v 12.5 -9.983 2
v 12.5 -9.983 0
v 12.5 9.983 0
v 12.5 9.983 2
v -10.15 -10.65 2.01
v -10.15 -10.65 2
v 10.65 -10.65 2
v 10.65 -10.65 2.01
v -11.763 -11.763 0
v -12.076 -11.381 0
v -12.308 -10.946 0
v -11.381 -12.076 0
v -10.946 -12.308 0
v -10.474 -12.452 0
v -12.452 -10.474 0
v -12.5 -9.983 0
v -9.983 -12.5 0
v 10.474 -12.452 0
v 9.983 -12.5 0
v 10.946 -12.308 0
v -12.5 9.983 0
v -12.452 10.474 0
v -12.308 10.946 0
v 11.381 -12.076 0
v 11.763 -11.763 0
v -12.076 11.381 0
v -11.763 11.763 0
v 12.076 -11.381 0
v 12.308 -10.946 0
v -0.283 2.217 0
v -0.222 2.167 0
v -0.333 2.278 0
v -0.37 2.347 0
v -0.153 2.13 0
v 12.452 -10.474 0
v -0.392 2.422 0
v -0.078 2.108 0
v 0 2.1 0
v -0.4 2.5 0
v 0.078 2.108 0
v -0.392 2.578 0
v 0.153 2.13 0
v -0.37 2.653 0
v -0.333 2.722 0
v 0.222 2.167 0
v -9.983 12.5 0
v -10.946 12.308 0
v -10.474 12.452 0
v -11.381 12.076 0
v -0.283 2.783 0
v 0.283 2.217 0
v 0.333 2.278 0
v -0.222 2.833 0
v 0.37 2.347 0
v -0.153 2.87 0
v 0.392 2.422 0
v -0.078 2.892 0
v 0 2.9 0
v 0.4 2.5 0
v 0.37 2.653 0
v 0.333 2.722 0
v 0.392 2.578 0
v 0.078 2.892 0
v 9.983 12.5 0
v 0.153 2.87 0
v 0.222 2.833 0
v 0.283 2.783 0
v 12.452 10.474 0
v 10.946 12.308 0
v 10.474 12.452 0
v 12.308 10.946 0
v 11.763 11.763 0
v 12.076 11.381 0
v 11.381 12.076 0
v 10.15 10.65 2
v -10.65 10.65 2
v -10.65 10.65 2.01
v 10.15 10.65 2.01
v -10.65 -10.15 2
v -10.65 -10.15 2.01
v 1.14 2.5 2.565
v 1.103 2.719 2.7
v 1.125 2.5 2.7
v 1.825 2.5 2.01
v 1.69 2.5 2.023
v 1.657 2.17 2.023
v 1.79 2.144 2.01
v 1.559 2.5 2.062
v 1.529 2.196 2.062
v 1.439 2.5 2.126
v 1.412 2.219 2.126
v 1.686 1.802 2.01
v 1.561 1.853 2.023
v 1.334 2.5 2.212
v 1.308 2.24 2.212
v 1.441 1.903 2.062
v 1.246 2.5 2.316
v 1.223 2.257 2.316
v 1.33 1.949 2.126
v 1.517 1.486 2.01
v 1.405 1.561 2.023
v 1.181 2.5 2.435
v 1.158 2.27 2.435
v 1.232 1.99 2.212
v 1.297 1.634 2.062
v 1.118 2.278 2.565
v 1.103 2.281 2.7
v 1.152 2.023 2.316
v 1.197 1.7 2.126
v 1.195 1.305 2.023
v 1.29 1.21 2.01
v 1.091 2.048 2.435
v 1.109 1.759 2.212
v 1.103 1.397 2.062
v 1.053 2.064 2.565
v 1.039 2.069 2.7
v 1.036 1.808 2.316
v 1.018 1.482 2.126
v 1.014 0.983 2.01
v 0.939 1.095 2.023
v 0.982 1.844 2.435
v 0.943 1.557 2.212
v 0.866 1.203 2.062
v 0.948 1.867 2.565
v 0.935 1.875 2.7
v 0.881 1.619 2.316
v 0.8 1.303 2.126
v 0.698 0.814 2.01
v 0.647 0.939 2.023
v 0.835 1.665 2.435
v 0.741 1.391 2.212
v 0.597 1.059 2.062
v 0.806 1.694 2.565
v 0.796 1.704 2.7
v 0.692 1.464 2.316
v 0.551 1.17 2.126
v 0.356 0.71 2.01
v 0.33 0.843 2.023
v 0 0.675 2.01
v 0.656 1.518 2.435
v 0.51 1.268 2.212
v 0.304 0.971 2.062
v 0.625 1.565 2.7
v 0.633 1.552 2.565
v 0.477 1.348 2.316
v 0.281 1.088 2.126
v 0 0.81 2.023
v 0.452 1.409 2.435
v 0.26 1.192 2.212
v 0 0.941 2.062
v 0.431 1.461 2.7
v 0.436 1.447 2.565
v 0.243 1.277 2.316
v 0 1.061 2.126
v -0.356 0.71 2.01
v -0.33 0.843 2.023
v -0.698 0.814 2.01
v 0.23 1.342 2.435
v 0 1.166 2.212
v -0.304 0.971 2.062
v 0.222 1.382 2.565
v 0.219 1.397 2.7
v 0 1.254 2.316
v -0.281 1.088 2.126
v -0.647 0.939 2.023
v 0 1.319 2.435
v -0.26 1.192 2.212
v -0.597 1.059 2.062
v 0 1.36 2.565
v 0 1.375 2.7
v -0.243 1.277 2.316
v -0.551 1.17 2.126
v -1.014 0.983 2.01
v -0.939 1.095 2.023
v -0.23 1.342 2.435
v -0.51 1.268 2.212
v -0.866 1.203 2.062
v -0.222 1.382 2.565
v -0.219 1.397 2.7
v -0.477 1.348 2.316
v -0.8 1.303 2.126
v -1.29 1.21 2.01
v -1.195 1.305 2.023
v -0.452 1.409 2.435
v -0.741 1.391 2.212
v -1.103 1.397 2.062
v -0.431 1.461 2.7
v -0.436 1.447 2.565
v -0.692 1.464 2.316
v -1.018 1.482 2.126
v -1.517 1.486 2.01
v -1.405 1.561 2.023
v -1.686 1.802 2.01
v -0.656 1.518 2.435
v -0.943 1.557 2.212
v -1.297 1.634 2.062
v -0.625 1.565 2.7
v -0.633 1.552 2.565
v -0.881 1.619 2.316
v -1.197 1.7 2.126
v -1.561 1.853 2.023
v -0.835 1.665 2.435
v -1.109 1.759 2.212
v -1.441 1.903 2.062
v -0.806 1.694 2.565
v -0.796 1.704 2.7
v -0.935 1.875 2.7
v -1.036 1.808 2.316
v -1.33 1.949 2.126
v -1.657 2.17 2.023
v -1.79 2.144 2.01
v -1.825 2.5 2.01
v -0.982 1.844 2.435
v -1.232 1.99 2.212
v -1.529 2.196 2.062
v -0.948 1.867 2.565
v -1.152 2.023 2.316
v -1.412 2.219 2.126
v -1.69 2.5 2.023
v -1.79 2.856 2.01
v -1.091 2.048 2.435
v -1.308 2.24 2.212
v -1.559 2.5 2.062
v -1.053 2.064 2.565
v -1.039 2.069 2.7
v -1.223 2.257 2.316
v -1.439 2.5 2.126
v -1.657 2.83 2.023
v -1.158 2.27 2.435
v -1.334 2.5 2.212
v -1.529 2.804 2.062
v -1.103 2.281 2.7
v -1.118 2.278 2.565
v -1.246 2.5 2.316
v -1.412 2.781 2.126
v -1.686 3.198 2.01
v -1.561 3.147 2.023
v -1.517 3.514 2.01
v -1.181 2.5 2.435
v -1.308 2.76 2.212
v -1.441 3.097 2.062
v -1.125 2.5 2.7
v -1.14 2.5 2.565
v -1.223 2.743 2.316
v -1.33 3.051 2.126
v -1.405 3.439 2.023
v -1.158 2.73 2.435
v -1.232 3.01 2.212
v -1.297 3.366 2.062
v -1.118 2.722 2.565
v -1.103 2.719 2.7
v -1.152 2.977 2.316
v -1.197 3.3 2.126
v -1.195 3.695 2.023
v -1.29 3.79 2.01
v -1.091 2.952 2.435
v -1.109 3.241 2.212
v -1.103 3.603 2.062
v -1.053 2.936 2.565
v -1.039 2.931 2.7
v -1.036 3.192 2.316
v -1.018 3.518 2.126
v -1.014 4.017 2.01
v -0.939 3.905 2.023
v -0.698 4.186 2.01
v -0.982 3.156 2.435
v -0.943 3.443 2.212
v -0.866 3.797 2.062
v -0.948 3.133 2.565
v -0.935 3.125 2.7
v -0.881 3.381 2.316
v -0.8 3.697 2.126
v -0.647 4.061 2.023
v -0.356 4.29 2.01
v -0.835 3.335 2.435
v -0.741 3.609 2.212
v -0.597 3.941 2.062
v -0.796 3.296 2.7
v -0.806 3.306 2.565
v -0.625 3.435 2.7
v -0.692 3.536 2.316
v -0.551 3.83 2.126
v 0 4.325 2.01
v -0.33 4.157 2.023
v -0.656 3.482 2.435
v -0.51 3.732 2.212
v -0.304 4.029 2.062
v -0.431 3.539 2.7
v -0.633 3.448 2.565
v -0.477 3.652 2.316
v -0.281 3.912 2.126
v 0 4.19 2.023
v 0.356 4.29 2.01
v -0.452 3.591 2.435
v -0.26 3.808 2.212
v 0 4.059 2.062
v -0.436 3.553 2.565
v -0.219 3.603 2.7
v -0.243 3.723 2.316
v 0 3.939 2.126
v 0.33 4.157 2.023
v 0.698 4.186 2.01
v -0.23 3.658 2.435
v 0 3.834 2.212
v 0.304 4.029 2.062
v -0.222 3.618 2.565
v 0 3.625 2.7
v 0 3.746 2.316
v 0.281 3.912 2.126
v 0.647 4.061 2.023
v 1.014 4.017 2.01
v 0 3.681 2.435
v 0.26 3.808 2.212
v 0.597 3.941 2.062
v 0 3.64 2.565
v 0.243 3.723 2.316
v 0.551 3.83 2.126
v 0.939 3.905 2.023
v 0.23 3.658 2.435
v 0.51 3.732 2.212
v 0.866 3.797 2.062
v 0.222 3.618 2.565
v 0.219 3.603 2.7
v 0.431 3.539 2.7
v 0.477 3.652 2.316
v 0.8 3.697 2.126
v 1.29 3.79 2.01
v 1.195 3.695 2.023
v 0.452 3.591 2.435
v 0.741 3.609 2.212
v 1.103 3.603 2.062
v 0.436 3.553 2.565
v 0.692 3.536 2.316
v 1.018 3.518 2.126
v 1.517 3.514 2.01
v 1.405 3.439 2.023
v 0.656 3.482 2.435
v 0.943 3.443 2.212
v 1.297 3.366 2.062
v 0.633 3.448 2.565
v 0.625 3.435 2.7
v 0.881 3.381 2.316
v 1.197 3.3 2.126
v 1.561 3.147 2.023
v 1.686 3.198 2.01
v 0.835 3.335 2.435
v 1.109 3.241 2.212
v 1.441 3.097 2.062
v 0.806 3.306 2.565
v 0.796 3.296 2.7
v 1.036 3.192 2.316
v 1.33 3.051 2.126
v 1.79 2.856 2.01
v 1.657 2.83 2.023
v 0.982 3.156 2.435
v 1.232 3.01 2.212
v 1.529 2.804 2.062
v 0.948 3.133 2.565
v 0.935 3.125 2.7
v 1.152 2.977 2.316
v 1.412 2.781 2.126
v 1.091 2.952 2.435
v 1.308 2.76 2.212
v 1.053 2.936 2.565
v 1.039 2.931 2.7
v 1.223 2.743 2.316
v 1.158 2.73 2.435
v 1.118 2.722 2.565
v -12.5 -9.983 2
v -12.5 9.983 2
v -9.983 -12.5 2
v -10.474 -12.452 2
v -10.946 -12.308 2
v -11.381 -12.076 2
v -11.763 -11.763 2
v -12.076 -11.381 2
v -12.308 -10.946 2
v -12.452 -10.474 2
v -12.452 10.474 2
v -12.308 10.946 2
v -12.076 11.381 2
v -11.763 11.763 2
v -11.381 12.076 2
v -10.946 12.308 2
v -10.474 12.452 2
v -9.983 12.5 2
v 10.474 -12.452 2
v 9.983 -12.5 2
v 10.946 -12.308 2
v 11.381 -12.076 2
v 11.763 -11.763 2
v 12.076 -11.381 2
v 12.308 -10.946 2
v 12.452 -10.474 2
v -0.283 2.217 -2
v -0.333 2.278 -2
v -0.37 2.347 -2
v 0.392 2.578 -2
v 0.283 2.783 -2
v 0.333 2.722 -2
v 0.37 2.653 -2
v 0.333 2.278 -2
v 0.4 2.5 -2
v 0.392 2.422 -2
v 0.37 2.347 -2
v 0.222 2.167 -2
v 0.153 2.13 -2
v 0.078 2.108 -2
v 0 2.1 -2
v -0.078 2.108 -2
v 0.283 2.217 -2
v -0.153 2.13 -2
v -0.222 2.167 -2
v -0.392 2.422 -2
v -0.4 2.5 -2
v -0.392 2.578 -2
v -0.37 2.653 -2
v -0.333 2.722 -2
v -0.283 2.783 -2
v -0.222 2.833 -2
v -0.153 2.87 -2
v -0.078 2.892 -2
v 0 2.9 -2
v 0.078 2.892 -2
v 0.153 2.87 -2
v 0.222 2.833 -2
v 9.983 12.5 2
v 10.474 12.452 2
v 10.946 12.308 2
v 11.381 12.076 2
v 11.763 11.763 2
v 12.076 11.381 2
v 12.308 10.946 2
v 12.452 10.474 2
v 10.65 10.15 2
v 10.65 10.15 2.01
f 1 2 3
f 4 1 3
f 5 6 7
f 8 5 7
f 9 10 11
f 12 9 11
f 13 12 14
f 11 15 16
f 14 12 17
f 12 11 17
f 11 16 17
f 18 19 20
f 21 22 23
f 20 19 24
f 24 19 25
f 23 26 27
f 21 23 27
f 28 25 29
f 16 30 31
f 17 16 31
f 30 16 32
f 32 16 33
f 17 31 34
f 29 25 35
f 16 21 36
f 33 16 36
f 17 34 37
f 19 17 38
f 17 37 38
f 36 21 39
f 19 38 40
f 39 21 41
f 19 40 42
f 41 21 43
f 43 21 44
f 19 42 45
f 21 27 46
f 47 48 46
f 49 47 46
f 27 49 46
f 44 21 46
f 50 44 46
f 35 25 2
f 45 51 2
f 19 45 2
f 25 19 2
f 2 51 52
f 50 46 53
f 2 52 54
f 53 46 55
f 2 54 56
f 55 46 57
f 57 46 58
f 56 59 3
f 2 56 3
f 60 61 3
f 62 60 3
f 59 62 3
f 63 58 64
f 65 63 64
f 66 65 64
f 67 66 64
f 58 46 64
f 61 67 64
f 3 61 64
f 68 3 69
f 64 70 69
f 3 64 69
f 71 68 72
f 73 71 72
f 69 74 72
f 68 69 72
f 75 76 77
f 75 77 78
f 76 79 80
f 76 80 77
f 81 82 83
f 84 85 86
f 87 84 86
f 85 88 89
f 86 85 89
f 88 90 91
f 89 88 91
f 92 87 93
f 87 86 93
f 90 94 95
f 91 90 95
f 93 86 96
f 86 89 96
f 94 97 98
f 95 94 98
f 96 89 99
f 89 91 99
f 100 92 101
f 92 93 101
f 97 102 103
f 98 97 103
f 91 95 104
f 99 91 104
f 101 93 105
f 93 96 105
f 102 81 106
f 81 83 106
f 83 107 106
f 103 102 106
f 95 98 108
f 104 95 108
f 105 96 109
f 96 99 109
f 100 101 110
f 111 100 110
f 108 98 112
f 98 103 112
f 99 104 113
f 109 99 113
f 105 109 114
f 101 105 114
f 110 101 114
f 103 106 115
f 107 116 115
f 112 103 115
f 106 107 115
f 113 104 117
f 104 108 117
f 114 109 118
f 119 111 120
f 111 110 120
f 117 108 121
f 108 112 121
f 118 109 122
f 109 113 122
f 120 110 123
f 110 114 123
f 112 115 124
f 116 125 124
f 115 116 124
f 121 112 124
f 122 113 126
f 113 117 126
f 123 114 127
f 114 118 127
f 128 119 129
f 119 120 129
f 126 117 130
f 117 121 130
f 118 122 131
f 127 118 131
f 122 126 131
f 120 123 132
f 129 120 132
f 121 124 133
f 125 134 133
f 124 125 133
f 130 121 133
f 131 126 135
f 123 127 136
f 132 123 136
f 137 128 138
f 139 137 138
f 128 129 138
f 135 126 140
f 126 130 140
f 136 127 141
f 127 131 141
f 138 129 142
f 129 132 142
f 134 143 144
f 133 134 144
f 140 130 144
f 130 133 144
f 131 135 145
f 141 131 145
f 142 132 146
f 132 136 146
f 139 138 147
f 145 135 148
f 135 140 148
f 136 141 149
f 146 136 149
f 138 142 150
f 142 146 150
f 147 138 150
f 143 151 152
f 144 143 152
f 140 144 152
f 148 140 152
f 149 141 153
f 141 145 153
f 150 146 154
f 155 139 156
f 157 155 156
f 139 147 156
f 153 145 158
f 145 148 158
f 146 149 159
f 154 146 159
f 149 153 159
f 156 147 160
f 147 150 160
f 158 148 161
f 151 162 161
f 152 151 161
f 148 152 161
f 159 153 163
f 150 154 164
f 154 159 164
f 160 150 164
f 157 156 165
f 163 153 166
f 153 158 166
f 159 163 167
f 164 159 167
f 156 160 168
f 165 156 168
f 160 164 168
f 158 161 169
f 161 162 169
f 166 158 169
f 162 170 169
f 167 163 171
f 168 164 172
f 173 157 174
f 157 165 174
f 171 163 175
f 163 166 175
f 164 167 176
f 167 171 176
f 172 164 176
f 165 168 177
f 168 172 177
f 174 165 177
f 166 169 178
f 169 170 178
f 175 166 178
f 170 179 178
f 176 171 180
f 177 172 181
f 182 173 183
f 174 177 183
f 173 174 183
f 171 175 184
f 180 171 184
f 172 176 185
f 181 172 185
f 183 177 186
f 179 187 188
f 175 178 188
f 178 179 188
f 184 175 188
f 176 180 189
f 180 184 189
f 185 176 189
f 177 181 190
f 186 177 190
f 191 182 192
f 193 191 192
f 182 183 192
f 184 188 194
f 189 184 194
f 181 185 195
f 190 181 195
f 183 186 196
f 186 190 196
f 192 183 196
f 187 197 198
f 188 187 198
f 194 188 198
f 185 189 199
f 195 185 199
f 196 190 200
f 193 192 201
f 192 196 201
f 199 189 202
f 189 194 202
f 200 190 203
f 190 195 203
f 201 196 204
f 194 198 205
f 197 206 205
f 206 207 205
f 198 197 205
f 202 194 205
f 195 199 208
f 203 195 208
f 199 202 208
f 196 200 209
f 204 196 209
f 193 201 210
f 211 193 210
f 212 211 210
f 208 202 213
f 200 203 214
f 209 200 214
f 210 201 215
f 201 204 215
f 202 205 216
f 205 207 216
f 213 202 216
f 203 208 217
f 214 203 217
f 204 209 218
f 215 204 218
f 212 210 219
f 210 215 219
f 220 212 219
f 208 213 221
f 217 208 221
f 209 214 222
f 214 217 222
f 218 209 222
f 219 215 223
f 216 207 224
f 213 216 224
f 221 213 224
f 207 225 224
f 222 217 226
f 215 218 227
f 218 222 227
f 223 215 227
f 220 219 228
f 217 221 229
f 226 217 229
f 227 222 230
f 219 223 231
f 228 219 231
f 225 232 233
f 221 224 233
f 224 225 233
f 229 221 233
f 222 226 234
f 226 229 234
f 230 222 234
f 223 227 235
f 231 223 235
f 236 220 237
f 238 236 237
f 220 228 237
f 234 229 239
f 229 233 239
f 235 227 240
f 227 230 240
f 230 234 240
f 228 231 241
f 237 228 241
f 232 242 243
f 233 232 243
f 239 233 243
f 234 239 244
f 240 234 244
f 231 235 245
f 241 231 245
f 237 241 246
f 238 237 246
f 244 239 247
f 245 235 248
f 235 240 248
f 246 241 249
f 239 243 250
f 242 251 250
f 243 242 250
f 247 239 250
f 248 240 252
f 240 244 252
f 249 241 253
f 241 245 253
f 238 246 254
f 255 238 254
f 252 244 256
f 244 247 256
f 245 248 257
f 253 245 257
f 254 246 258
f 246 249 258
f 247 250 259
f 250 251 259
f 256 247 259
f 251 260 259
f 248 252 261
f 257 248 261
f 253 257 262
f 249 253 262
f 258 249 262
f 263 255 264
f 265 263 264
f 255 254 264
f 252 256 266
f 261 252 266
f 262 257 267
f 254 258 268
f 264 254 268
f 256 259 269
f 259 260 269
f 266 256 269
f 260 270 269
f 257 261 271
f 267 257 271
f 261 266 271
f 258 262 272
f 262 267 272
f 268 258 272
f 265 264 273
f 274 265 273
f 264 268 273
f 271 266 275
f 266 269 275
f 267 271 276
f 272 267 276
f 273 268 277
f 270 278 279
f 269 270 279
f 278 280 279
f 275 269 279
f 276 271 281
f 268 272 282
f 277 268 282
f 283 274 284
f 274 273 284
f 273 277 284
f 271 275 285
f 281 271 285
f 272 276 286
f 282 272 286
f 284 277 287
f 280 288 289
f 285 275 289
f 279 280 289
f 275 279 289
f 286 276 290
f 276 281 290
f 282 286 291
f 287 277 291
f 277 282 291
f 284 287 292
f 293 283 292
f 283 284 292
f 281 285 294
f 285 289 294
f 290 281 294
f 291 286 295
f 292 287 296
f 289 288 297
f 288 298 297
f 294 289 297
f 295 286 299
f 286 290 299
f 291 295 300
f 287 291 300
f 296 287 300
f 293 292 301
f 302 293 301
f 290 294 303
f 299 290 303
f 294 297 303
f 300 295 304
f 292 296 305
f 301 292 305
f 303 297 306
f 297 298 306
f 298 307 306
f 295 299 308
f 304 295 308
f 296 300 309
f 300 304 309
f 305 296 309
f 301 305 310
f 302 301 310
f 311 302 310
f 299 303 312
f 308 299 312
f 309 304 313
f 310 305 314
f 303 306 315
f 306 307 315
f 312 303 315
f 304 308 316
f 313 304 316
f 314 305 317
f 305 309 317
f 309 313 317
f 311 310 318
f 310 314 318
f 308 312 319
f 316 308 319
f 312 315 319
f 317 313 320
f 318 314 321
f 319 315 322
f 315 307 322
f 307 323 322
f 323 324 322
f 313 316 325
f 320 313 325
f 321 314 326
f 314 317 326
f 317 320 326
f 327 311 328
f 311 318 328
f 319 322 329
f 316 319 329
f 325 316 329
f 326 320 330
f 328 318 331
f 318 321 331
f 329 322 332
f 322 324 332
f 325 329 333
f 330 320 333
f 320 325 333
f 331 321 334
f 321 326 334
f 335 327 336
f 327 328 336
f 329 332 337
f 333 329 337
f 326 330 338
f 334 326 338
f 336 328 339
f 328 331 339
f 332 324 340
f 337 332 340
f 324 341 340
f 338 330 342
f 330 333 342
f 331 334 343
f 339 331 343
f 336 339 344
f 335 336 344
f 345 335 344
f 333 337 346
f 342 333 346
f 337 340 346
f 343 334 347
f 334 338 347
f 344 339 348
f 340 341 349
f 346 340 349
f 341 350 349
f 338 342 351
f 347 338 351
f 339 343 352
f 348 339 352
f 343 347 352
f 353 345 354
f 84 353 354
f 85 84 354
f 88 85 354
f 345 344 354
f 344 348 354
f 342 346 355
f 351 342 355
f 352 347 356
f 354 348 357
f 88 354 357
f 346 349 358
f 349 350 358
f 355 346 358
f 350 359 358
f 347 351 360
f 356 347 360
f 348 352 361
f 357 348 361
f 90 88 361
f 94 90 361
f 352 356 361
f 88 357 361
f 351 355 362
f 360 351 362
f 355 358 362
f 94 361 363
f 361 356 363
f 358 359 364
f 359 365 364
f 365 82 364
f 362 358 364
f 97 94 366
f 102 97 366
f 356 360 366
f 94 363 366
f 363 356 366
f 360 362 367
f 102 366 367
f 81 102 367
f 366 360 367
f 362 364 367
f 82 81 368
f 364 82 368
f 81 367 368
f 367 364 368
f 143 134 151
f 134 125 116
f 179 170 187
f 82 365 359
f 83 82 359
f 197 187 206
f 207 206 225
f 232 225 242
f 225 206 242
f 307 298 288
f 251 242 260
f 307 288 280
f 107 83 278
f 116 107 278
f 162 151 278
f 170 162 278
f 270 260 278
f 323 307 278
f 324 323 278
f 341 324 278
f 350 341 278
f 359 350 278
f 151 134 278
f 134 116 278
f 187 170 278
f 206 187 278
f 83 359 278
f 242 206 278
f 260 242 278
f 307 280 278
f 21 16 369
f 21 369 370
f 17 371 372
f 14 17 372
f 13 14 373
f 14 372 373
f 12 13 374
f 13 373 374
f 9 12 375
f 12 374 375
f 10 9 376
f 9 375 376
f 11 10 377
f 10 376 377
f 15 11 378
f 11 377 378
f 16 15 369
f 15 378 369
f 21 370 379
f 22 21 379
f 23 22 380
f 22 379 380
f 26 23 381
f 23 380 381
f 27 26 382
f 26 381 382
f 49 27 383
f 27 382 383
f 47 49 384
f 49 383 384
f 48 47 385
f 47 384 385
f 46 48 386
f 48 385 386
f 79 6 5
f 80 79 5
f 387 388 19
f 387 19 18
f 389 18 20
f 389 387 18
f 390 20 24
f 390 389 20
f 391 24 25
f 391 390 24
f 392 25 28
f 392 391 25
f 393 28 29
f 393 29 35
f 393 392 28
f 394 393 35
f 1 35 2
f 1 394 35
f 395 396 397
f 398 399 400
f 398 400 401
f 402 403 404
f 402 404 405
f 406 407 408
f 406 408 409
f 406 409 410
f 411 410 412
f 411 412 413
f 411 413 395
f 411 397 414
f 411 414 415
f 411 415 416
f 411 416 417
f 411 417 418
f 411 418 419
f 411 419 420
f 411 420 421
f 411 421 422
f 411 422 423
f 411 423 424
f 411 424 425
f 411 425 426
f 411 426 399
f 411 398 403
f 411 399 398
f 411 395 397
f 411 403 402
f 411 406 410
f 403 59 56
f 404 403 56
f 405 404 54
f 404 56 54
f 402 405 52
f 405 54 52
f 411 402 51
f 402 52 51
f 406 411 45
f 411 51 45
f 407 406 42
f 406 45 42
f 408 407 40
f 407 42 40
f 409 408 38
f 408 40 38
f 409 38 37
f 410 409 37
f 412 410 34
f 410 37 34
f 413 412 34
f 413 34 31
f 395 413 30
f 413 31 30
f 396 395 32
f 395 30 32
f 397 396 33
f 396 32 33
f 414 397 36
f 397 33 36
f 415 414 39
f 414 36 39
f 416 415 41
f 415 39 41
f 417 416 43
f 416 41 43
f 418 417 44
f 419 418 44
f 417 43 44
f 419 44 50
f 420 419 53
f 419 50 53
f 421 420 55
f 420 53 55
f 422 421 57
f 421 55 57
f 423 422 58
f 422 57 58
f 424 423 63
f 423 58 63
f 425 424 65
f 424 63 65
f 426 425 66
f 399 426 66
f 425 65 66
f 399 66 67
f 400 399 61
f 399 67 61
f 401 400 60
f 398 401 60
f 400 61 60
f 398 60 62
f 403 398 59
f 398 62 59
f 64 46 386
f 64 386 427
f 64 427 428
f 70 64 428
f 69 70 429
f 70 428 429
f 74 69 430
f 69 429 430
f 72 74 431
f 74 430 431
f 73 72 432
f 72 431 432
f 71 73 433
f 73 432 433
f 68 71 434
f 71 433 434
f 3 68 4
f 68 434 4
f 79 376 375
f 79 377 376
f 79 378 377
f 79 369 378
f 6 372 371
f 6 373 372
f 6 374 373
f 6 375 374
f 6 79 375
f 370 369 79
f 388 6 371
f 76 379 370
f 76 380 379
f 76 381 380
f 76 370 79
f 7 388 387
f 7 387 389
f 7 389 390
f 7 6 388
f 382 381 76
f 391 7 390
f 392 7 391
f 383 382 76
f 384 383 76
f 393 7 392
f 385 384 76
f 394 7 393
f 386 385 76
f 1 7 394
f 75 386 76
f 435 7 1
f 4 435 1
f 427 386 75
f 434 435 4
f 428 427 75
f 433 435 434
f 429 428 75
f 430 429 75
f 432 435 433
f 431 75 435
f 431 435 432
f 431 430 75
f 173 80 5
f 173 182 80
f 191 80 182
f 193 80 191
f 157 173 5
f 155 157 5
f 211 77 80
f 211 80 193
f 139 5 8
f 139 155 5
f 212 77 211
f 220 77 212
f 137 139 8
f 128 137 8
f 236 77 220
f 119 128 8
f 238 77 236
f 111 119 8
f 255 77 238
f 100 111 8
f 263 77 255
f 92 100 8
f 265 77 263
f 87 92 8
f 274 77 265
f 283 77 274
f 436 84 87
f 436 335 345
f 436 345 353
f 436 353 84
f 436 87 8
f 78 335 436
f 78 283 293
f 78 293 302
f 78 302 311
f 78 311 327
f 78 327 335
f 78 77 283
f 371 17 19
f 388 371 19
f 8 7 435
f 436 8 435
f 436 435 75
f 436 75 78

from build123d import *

# Parameters (mm, degrees)
SKETCH1_W           = 25
SKETCH1_H           = 25
BOSS_EXTRUDE1_DEPTH = 2
SKETCH4_R           = 1.125
BOSS_EXTRUDE3_DEPTH = 0.7
SKETCH5_W           = 21.3
SKETCH5_H           = 21.3
BOSS_EXTRUDE4_DEPTH = 0.01
FILLET1_R           = 0.7
CHAMFER1_SIZE       = 0.5
CUT_EXTRUDE1_DEPTH  = 18.790446875
SKETCH7_R           = 0.4
BOSS_EXTRUDE5_DEPTH = 2


with BuildPart() as part:
    # Sketch1 → Boss-Extrude1 (new body)
    with BuildSketch(Plane.XY):
        Rectangle(SKETCH1_W, SKETCH1_H)
    extrude(amount=BOSS_EXTRUDE1_DEPTH)

    # Sketch4 → Boss-Extrude3 (add)
    with BuildSketch(Plane.XY.offset(2)):
        with Locations((0, 2.5)):
            Circle(SKETCH4_R)
    extrude(amount=BOSS_EXTRUDE3_DEPTH)

    # Sketch5 → Boss-Extrude4 (add)
    with BuildSketch(Plane.XY.offset(2)):
        Rectangle(SKETCH5_W, SKETCH5_H)
    extrude(amount=BOSS_EXTRUDE4_DEPTH)

    # Fillet1
    # the kernel refuses this fillet: 0.7 mm, written as the material it adds along each edge
    with BuildSketch(Plane(origin=(0, 2.5, 2.01), x_dir=(1, 0, 0), z_dir=(0, 1, 0))) as fillet1_piece_1_section:
        with BuildLine():
            CenterArc((1.125 + FILLET1_R, -FILLET1_R), FILLET1_R, 90, 90)
            Line((1.125, -FILLET1_R), (1.125, 0))
            Line((1.125, 0), (1.125 + FILLET1_R, 0))
        make_face()
    fillet1_piece_1 = revolve(axis=Axis((0, 2.5, 2.01), (0, 0, -1)), mode=Mode.PRIVATE)
    fillet1_piece_1 = split(fillet1_piece_1, bisect_by=Plane(origin=(-1.326537578, 2.5, 2.7), z_dir=(0, 0, -1)), keep=Keep.TOP, mode=Mode.PRIVATE)
    add(fillet1_piece_1)

    # Chamfer1
    chamfer1_edges = [part.edges().sort_by_distance(p)[0] for p in [
        (-10.65, -10.65, 2.005),
        (10.65, 10.65, 2.005),
    ]]
    chamfer(chamfer1_edges, length=CHAMFER1_SIZE)

    # Sketch6 → Cut-Extrude1 (cut, through all)
    with BuildSketch(Plane.XY.offset(2)):
        with BuildLine():
            Line((12.5, 9.98277308), (12.5, 12.5))
            Line((12.5, 12.5), (9.98277308, 12.5))
            ThreePointArc((9.98277308, 12.5), (11.762721305, 11.762721305), (12.5, 9.98277308))
        make_face()
        with BuildLine():
            Line((-9.98277308, 12.5), (-12.5, 12.5))
            Line((-12.5, 12.5), (-12.5, 9.98277308))
            ThreePointArc((-12.5, 9.98277308), (-11.762721305, 11.762721305), (-9.98277308, 12.5))
        make_face()
        with BuildLine():
            Line((-12.5, -9.98277308), (-12.5, -12.5))
            Line((-12.5, -12.5), (-9.98277308, -12.5))
            ThreePointArc((-9.98277308, -12.5), (-11.762721305, -11.762721305), (-12.5, -9.98277308))
        make_face()
        with BuildLine():
            Line((12.5, -9.98277308), (12.5, -12.5))
            Line((12.5, -12.5), (9.98277308, -12.5))
            ThreePointArc((9.98277308, -12.5), (11.762721305, -11.762721305), (12.5, -9.98277308))
        make_face()
    extrude(amount=-CUT_EXTRUDE1_DEPTH, mode=Mode.SUBTRACT)

    # Sketch7 → Boss-Extrude5 (add)
    with BuildSketch(Plane(origin=(0, 0, 0), x_dir=(-1, 0, 0), z_dir=(0, 0, -1))):
        with Locations(Location((0, 2.5, 0), (0, 0, 180))):
            Circle(SKETCH7_R)
    extrude(amount=BOSS_EXTRUDE5_DEPTH)


solid = part.part
